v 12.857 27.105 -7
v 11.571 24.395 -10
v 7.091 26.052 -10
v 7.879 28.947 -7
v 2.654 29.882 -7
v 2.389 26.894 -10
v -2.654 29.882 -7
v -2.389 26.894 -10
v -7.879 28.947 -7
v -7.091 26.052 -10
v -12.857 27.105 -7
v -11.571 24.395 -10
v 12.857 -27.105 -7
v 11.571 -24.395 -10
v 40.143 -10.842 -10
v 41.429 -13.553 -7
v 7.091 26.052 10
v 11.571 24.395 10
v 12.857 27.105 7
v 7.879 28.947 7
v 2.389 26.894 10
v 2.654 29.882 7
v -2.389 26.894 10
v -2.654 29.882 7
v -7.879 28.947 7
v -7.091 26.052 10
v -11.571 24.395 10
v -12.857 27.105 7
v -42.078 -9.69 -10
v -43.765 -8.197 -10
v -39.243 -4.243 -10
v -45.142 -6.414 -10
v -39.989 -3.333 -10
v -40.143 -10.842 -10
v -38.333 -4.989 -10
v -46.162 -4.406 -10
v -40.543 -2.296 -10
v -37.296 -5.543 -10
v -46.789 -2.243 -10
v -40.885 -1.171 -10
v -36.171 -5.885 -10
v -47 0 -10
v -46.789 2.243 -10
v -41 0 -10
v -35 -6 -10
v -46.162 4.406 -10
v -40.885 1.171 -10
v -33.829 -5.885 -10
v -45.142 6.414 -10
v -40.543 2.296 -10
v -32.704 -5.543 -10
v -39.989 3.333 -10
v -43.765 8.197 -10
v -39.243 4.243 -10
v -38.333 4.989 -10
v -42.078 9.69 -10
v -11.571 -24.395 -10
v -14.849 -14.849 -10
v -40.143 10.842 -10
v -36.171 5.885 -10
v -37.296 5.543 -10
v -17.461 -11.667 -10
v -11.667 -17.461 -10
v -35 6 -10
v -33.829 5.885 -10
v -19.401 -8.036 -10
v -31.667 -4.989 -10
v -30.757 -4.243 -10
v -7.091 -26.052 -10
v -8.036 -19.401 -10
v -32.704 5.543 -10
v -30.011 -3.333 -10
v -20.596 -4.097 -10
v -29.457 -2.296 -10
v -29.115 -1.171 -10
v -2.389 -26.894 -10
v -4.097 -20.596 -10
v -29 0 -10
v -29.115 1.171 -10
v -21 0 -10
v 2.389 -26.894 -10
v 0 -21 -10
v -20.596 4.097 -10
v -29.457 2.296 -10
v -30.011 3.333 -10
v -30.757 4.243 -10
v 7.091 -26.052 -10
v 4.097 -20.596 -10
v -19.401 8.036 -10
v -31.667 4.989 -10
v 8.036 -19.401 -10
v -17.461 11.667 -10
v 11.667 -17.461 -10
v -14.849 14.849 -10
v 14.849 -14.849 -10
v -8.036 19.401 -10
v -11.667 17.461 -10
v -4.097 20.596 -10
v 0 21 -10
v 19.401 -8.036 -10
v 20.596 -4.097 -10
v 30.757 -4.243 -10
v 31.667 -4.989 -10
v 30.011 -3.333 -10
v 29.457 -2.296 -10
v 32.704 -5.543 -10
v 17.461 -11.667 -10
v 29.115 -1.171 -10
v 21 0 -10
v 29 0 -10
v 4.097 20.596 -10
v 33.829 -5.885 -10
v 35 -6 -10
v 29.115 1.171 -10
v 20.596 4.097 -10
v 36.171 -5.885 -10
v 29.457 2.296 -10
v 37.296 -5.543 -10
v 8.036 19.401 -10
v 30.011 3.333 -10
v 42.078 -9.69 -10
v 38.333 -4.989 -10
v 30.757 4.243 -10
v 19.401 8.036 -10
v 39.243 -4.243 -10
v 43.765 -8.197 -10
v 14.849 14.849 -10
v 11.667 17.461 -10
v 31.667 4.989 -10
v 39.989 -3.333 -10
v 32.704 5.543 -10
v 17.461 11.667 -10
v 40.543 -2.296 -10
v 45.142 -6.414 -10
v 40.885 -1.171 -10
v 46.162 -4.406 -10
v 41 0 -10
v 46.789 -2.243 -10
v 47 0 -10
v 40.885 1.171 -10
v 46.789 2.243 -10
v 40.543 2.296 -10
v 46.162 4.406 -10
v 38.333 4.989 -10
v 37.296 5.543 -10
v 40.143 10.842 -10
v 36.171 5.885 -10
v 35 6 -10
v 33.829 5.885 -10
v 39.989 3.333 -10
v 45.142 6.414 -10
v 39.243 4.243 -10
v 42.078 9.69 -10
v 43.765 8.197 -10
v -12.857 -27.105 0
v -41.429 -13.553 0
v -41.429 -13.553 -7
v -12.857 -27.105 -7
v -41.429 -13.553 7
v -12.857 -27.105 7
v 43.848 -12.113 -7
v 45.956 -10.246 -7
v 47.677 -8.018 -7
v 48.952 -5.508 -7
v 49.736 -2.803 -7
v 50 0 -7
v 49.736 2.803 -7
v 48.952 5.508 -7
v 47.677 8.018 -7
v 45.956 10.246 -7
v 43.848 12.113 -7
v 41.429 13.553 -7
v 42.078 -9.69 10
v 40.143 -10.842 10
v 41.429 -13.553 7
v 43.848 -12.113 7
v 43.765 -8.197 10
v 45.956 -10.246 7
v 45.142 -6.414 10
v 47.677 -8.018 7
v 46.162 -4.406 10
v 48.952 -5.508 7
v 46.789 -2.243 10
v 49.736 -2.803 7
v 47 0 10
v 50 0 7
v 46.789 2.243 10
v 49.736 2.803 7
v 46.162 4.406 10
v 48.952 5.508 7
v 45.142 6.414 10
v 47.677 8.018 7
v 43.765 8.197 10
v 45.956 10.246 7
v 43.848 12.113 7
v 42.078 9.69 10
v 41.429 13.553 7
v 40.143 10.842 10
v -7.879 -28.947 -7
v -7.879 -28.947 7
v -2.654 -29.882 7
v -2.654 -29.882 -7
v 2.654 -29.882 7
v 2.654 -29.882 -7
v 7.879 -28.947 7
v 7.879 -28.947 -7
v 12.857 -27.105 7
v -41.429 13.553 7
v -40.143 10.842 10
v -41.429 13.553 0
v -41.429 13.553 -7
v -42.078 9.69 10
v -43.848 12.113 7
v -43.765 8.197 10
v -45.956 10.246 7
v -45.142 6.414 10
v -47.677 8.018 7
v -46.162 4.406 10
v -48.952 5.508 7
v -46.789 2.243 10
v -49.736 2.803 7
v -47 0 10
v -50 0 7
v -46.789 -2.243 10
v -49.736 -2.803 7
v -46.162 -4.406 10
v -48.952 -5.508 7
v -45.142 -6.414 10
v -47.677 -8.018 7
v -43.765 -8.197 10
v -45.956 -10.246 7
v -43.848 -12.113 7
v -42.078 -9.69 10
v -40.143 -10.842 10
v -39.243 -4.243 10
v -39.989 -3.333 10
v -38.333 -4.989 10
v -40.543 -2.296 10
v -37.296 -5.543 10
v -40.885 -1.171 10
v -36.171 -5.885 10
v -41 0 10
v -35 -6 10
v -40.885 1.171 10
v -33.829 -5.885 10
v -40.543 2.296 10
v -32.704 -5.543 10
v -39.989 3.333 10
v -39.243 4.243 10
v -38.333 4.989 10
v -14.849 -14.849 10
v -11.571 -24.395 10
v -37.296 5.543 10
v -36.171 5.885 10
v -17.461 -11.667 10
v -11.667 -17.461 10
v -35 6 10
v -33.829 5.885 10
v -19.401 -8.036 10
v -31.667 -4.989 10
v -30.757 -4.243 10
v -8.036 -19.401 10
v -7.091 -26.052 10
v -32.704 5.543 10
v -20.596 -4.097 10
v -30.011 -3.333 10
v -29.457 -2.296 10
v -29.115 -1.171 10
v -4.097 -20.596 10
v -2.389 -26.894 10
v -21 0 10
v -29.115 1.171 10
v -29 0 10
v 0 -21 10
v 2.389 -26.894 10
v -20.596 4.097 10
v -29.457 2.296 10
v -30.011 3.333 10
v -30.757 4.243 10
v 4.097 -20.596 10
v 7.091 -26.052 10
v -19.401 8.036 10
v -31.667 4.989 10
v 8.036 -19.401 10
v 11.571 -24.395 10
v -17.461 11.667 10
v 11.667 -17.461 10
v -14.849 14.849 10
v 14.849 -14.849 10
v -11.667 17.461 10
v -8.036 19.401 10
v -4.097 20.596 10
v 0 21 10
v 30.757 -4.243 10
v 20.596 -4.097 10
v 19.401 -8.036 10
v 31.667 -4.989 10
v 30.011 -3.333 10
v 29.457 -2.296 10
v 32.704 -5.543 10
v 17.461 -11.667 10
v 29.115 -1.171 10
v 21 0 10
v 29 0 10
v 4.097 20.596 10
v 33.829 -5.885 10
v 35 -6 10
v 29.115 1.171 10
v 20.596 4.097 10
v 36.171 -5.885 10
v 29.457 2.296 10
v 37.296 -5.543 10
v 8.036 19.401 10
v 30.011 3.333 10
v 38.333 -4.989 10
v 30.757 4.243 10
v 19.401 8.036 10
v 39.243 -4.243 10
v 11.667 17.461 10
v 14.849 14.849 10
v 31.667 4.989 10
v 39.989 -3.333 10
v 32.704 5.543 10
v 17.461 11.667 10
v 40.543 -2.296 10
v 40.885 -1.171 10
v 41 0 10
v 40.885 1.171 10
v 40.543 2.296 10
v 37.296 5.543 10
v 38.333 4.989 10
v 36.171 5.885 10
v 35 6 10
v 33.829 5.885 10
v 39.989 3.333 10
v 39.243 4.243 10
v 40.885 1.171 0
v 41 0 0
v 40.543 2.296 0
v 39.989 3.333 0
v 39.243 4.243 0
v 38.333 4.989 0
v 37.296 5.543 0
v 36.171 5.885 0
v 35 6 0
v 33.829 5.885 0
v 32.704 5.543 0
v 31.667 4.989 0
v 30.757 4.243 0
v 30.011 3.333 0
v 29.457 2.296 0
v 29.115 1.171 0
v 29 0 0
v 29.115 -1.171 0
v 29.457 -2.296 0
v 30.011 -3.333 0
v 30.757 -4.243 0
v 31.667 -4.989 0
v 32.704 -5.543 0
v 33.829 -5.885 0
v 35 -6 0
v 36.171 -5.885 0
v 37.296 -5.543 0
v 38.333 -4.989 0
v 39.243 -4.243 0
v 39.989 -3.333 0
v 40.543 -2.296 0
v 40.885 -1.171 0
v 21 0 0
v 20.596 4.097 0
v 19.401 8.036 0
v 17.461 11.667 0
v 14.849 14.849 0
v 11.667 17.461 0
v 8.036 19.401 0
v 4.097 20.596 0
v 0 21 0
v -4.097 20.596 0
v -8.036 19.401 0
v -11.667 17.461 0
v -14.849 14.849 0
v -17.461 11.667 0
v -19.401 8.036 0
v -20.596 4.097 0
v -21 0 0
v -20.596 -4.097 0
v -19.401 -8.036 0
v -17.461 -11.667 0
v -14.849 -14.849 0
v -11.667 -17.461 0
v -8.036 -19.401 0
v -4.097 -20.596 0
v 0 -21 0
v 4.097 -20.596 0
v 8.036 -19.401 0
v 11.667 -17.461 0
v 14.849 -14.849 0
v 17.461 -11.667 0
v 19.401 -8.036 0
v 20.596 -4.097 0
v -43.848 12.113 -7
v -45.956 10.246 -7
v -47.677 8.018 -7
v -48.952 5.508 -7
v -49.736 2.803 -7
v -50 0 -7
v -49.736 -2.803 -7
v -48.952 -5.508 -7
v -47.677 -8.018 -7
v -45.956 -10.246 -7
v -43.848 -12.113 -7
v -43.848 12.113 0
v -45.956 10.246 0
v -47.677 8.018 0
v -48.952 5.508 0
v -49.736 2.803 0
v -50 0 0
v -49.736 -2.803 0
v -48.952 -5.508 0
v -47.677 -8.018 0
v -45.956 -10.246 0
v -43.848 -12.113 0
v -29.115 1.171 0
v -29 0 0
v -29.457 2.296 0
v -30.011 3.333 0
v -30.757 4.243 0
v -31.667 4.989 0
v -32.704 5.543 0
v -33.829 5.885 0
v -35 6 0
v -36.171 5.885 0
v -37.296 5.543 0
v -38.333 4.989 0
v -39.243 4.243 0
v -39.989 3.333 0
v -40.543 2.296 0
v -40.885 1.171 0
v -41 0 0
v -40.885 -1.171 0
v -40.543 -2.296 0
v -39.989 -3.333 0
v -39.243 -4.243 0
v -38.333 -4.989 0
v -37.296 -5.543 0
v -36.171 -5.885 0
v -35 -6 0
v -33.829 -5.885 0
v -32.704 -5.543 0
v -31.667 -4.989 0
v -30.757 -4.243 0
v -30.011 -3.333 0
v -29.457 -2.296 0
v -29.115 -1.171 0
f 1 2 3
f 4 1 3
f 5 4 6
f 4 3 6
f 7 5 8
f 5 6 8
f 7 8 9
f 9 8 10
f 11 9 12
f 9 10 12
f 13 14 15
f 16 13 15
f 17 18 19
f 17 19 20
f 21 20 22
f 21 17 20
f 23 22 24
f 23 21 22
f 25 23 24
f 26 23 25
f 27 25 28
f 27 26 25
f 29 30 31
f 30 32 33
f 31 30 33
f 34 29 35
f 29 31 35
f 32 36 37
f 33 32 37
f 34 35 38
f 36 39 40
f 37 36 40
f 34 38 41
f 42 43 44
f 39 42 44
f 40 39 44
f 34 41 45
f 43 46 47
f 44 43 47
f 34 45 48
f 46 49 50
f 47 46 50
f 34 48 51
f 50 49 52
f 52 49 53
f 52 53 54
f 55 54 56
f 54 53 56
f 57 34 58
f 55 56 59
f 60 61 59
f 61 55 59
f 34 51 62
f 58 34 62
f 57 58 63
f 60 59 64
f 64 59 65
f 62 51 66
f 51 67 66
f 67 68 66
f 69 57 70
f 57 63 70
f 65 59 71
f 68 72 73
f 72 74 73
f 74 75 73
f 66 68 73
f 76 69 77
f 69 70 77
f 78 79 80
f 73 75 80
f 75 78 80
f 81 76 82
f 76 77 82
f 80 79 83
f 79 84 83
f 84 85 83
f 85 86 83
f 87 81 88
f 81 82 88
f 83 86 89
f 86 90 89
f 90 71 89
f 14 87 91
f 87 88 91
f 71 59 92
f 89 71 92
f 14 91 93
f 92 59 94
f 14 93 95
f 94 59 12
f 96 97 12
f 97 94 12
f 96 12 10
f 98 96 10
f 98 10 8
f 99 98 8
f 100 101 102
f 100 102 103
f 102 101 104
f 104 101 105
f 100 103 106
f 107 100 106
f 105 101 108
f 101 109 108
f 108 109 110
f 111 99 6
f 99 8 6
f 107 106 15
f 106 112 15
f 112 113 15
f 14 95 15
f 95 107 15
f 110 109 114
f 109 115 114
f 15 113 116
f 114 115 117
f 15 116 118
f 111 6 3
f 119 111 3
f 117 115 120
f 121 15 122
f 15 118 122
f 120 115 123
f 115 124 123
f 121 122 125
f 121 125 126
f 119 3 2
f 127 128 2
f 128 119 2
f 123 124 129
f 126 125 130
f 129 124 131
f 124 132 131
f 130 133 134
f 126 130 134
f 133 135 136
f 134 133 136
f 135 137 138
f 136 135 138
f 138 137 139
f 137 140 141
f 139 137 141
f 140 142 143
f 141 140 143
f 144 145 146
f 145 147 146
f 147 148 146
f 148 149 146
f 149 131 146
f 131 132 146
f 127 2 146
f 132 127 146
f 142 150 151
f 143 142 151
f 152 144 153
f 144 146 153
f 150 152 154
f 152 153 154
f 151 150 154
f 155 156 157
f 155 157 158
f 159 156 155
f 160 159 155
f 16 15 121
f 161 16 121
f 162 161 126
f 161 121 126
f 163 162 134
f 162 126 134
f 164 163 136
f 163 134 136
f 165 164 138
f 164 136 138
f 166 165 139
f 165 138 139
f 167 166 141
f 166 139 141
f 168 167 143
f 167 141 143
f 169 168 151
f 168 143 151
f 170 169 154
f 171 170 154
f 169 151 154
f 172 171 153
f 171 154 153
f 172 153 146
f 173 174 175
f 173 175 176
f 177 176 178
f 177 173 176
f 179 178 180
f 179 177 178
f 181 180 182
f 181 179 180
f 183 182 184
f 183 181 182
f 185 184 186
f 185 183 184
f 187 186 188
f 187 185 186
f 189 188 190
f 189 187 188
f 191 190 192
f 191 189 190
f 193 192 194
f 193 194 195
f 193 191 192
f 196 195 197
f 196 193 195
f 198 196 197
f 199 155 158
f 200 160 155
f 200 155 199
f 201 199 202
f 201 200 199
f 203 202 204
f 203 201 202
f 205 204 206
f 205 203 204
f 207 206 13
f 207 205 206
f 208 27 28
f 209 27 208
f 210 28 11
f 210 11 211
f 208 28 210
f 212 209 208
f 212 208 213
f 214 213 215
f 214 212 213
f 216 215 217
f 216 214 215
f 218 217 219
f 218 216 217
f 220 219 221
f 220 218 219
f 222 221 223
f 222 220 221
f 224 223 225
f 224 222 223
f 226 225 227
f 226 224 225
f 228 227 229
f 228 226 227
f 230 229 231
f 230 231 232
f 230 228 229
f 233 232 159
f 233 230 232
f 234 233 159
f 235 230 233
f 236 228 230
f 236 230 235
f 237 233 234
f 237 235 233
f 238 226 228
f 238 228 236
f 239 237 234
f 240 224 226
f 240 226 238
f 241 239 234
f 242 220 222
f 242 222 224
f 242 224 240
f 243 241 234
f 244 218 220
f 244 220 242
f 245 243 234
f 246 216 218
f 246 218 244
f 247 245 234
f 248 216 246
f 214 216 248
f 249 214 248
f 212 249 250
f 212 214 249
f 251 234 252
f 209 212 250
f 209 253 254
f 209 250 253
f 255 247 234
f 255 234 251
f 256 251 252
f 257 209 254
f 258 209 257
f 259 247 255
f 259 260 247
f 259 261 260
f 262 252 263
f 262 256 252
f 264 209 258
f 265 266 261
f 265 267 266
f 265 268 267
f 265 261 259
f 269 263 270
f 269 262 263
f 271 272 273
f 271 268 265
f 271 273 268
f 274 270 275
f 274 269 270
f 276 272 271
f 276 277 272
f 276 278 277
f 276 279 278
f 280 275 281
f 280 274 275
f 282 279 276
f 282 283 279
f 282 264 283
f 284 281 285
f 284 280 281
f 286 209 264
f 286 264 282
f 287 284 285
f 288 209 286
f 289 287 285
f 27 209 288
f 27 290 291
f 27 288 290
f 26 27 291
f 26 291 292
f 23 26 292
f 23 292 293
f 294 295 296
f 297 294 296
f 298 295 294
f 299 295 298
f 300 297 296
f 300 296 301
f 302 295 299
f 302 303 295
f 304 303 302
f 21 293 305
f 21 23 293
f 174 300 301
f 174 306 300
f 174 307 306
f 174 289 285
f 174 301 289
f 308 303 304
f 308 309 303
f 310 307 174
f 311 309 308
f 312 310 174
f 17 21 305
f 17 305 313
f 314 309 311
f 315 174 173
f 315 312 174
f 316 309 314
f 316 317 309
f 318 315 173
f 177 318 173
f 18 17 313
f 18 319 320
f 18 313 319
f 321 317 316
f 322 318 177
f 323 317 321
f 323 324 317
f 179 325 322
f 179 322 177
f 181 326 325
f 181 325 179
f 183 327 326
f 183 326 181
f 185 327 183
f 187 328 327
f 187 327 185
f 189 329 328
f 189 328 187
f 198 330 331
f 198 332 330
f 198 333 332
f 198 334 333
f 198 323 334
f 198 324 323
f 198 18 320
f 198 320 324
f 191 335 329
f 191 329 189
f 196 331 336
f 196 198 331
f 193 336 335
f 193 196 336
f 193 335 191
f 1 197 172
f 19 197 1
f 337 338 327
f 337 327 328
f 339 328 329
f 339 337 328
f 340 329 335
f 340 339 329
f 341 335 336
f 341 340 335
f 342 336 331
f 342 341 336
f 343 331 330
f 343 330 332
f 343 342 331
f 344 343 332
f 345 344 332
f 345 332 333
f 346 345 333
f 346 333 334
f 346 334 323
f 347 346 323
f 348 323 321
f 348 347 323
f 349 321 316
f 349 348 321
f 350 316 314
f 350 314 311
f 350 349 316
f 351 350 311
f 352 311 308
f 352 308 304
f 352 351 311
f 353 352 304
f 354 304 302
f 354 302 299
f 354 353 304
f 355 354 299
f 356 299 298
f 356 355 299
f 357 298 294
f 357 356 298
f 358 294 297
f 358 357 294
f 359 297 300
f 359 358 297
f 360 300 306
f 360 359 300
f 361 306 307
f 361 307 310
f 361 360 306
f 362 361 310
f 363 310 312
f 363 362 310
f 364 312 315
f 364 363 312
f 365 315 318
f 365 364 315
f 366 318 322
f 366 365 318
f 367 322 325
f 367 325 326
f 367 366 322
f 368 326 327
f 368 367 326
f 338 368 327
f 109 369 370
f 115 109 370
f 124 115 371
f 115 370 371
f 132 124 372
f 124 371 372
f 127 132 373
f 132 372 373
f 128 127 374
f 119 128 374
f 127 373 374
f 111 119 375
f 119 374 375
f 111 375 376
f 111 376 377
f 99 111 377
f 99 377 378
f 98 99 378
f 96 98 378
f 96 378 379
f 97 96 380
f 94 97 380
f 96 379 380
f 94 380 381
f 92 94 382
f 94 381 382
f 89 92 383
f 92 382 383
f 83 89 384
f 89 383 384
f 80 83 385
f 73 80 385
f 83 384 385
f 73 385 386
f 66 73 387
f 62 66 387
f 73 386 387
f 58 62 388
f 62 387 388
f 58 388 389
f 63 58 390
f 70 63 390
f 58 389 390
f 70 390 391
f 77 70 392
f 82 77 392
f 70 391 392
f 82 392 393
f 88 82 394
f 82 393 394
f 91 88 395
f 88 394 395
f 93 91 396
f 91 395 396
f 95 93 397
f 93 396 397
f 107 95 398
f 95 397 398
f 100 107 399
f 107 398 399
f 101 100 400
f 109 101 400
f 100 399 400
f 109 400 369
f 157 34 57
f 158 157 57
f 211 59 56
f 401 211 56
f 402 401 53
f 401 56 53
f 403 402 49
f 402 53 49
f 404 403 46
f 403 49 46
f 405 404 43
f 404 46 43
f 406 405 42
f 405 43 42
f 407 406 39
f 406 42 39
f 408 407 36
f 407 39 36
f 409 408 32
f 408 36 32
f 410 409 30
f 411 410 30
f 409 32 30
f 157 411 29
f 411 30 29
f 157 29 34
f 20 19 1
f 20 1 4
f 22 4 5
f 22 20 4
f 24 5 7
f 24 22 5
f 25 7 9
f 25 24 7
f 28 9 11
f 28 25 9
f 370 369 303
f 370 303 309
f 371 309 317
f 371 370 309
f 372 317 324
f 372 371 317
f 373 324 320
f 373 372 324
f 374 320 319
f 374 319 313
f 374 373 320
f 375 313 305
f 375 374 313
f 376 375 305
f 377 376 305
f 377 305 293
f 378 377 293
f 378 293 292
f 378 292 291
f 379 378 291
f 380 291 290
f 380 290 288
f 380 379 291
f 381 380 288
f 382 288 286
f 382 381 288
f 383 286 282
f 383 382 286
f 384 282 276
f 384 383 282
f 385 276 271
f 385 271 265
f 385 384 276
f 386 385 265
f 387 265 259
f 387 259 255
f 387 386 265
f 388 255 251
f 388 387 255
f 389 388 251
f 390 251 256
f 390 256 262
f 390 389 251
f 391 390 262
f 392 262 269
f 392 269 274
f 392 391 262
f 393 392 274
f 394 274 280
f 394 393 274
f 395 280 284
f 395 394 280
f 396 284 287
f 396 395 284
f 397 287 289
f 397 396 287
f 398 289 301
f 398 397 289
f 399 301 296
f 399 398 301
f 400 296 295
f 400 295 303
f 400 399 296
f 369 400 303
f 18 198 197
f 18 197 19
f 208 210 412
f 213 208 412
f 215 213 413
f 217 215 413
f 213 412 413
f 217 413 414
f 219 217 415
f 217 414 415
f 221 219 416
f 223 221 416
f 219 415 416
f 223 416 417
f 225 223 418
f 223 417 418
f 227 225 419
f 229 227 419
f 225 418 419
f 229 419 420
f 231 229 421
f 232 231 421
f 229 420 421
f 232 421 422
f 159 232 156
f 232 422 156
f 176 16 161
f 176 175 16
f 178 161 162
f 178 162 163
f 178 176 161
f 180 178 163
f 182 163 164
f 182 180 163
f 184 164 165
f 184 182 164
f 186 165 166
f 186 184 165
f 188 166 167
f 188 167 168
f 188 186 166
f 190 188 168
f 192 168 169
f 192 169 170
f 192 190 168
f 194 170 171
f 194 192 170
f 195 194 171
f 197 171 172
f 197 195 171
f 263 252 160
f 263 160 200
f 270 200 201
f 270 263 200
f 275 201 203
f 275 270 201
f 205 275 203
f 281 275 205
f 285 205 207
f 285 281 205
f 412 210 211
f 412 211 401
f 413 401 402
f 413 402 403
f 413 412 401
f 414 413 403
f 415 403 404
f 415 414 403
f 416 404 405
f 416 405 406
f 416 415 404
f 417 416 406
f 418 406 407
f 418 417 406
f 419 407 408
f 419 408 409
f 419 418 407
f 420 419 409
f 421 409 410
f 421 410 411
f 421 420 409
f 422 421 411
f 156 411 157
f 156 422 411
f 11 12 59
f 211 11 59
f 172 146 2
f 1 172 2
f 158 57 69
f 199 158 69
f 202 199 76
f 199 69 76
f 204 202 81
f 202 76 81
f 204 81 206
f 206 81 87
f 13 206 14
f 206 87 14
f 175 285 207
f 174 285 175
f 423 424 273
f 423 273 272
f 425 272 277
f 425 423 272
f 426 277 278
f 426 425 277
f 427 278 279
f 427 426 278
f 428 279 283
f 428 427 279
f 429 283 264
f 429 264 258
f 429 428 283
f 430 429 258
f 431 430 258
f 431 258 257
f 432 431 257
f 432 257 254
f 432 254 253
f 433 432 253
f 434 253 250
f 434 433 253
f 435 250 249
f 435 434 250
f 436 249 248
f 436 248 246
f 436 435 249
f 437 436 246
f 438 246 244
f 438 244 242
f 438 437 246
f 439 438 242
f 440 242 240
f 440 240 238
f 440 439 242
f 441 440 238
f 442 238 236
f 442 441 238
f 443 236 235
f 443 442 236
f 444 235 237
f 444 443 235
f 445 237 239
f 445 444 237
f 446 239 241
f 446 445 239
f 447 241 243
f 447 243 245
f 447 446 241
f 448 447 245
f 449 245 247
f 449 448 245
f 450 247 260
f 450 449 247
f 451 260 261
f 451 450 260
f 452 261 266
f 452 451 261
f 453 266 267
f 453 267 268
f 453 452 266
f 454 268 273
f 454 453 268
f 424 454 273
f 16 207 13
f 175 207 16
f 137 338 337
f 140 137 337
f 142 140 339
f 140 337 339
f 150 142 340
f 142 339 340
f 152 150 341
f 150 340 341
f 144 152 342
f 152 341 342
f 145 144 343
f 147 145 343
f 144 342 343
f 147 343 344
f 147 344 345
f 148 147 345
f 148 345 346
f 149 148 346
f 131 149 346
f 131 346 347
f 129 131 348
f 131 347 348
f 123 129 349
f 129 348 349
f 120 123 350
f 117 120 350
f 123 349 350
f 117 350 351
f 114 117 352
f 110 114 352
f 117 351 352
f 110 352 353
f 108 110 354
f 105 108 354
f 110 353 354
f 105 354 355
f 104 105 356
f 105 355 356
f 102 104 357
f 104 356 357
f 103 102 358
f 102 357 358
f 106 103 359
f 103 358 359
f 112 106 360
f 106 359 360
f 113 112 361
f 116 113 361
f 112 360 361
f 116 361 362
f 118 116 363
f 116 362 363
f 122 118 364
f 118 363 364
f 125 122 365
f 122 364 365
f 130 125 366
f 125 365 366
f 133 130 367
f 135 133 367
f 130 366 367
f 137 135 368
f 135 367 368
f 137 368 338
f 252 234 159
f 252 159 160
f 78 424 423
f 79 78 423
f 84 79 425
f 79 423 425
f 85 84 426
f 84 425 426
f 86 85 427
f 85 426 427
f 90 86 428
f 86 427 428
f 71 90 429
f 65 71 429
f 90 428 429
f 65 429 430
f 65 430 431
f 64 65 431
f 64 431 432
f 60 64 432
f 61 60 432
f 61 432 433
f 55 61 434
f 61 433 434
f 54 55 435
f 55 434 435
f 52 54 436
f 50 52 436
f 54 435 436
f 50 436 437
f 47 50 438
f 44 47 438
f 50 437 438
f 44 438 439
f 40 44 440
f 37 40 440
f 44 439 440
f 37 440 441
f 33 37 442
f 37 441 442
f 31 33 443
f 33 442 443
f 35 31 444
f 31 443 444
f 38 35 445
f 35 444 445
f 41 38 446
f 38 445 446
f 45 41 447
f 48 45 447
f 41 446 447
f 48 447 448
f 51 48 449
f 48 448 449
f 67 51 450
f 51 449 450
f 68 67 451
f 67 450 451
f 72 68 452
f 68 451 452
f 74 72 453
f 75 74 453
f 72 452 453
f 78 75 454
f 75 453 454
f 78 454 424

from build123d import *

# Parameters (mm, degrees)
F0_R     = 6
F0_R_2   = 21
F1_DEPTH = 10
F2_SIZE  = 3


with BuildPart() as f1:
    # F0 (on Top) → F1 (new body)
    with BuildSketch(Plane.XY):
        with BuildLine():
            Line((41.428571, 13.552619), (12.857143, 27.105237))
            ThreePointArc((12.857143, 27.105237), (0, 30), (-12.857143, 27.105237))
            Line((-12.857143, 27.105237), (-41.428571, 13.552619))
            ThreePointArc((-41.428571, 13.552619), (-50, 0), (-41.428571, -13.552619))
            Line((-41.428571, -13.552619), (-12.857143, -27.105237))
            ThreePointArc((-12.857143, -27.105237), (0, -30), (12.857143, -27.105237))
            Line((12.857143, -27.105237), (41.428571, -13.552619))
            ThreePointArc((41.428571, -13.552619), (50, 0), (41.428571, 13.552619))
        make_face()
        with Locations((-35, 0)):
            Circle(F0_R, mode=Mode.SUBTRACT)
        Circle(F0_R_2, mode=Mode.SUBTRACT)
        with Locations((35, 0)):
            Circle(F0_R, mode=Mode.SUBTRACT)
    extrude(amount=F1_DEPTH)

    # F2
    f2_edges = [f1.edges().sort_by_distance(p)[0] for p in [
        (-27.142857, -20.328928, 10),
        (0, -30, 10),
        (27.142857, -20.328928, 10),
    ]]
    chamfer(f2_edges, length=F2_SIZE)

    # F3: F1 across face


with BuildPart() as f1_1:
    add(f1.part)
    add(f1.part.mirror(Plane(origin=(0, 0, 0), x_dir=(1, 0, 0), z_dir=(0, 0, -1))))


solid = f1_1.part
